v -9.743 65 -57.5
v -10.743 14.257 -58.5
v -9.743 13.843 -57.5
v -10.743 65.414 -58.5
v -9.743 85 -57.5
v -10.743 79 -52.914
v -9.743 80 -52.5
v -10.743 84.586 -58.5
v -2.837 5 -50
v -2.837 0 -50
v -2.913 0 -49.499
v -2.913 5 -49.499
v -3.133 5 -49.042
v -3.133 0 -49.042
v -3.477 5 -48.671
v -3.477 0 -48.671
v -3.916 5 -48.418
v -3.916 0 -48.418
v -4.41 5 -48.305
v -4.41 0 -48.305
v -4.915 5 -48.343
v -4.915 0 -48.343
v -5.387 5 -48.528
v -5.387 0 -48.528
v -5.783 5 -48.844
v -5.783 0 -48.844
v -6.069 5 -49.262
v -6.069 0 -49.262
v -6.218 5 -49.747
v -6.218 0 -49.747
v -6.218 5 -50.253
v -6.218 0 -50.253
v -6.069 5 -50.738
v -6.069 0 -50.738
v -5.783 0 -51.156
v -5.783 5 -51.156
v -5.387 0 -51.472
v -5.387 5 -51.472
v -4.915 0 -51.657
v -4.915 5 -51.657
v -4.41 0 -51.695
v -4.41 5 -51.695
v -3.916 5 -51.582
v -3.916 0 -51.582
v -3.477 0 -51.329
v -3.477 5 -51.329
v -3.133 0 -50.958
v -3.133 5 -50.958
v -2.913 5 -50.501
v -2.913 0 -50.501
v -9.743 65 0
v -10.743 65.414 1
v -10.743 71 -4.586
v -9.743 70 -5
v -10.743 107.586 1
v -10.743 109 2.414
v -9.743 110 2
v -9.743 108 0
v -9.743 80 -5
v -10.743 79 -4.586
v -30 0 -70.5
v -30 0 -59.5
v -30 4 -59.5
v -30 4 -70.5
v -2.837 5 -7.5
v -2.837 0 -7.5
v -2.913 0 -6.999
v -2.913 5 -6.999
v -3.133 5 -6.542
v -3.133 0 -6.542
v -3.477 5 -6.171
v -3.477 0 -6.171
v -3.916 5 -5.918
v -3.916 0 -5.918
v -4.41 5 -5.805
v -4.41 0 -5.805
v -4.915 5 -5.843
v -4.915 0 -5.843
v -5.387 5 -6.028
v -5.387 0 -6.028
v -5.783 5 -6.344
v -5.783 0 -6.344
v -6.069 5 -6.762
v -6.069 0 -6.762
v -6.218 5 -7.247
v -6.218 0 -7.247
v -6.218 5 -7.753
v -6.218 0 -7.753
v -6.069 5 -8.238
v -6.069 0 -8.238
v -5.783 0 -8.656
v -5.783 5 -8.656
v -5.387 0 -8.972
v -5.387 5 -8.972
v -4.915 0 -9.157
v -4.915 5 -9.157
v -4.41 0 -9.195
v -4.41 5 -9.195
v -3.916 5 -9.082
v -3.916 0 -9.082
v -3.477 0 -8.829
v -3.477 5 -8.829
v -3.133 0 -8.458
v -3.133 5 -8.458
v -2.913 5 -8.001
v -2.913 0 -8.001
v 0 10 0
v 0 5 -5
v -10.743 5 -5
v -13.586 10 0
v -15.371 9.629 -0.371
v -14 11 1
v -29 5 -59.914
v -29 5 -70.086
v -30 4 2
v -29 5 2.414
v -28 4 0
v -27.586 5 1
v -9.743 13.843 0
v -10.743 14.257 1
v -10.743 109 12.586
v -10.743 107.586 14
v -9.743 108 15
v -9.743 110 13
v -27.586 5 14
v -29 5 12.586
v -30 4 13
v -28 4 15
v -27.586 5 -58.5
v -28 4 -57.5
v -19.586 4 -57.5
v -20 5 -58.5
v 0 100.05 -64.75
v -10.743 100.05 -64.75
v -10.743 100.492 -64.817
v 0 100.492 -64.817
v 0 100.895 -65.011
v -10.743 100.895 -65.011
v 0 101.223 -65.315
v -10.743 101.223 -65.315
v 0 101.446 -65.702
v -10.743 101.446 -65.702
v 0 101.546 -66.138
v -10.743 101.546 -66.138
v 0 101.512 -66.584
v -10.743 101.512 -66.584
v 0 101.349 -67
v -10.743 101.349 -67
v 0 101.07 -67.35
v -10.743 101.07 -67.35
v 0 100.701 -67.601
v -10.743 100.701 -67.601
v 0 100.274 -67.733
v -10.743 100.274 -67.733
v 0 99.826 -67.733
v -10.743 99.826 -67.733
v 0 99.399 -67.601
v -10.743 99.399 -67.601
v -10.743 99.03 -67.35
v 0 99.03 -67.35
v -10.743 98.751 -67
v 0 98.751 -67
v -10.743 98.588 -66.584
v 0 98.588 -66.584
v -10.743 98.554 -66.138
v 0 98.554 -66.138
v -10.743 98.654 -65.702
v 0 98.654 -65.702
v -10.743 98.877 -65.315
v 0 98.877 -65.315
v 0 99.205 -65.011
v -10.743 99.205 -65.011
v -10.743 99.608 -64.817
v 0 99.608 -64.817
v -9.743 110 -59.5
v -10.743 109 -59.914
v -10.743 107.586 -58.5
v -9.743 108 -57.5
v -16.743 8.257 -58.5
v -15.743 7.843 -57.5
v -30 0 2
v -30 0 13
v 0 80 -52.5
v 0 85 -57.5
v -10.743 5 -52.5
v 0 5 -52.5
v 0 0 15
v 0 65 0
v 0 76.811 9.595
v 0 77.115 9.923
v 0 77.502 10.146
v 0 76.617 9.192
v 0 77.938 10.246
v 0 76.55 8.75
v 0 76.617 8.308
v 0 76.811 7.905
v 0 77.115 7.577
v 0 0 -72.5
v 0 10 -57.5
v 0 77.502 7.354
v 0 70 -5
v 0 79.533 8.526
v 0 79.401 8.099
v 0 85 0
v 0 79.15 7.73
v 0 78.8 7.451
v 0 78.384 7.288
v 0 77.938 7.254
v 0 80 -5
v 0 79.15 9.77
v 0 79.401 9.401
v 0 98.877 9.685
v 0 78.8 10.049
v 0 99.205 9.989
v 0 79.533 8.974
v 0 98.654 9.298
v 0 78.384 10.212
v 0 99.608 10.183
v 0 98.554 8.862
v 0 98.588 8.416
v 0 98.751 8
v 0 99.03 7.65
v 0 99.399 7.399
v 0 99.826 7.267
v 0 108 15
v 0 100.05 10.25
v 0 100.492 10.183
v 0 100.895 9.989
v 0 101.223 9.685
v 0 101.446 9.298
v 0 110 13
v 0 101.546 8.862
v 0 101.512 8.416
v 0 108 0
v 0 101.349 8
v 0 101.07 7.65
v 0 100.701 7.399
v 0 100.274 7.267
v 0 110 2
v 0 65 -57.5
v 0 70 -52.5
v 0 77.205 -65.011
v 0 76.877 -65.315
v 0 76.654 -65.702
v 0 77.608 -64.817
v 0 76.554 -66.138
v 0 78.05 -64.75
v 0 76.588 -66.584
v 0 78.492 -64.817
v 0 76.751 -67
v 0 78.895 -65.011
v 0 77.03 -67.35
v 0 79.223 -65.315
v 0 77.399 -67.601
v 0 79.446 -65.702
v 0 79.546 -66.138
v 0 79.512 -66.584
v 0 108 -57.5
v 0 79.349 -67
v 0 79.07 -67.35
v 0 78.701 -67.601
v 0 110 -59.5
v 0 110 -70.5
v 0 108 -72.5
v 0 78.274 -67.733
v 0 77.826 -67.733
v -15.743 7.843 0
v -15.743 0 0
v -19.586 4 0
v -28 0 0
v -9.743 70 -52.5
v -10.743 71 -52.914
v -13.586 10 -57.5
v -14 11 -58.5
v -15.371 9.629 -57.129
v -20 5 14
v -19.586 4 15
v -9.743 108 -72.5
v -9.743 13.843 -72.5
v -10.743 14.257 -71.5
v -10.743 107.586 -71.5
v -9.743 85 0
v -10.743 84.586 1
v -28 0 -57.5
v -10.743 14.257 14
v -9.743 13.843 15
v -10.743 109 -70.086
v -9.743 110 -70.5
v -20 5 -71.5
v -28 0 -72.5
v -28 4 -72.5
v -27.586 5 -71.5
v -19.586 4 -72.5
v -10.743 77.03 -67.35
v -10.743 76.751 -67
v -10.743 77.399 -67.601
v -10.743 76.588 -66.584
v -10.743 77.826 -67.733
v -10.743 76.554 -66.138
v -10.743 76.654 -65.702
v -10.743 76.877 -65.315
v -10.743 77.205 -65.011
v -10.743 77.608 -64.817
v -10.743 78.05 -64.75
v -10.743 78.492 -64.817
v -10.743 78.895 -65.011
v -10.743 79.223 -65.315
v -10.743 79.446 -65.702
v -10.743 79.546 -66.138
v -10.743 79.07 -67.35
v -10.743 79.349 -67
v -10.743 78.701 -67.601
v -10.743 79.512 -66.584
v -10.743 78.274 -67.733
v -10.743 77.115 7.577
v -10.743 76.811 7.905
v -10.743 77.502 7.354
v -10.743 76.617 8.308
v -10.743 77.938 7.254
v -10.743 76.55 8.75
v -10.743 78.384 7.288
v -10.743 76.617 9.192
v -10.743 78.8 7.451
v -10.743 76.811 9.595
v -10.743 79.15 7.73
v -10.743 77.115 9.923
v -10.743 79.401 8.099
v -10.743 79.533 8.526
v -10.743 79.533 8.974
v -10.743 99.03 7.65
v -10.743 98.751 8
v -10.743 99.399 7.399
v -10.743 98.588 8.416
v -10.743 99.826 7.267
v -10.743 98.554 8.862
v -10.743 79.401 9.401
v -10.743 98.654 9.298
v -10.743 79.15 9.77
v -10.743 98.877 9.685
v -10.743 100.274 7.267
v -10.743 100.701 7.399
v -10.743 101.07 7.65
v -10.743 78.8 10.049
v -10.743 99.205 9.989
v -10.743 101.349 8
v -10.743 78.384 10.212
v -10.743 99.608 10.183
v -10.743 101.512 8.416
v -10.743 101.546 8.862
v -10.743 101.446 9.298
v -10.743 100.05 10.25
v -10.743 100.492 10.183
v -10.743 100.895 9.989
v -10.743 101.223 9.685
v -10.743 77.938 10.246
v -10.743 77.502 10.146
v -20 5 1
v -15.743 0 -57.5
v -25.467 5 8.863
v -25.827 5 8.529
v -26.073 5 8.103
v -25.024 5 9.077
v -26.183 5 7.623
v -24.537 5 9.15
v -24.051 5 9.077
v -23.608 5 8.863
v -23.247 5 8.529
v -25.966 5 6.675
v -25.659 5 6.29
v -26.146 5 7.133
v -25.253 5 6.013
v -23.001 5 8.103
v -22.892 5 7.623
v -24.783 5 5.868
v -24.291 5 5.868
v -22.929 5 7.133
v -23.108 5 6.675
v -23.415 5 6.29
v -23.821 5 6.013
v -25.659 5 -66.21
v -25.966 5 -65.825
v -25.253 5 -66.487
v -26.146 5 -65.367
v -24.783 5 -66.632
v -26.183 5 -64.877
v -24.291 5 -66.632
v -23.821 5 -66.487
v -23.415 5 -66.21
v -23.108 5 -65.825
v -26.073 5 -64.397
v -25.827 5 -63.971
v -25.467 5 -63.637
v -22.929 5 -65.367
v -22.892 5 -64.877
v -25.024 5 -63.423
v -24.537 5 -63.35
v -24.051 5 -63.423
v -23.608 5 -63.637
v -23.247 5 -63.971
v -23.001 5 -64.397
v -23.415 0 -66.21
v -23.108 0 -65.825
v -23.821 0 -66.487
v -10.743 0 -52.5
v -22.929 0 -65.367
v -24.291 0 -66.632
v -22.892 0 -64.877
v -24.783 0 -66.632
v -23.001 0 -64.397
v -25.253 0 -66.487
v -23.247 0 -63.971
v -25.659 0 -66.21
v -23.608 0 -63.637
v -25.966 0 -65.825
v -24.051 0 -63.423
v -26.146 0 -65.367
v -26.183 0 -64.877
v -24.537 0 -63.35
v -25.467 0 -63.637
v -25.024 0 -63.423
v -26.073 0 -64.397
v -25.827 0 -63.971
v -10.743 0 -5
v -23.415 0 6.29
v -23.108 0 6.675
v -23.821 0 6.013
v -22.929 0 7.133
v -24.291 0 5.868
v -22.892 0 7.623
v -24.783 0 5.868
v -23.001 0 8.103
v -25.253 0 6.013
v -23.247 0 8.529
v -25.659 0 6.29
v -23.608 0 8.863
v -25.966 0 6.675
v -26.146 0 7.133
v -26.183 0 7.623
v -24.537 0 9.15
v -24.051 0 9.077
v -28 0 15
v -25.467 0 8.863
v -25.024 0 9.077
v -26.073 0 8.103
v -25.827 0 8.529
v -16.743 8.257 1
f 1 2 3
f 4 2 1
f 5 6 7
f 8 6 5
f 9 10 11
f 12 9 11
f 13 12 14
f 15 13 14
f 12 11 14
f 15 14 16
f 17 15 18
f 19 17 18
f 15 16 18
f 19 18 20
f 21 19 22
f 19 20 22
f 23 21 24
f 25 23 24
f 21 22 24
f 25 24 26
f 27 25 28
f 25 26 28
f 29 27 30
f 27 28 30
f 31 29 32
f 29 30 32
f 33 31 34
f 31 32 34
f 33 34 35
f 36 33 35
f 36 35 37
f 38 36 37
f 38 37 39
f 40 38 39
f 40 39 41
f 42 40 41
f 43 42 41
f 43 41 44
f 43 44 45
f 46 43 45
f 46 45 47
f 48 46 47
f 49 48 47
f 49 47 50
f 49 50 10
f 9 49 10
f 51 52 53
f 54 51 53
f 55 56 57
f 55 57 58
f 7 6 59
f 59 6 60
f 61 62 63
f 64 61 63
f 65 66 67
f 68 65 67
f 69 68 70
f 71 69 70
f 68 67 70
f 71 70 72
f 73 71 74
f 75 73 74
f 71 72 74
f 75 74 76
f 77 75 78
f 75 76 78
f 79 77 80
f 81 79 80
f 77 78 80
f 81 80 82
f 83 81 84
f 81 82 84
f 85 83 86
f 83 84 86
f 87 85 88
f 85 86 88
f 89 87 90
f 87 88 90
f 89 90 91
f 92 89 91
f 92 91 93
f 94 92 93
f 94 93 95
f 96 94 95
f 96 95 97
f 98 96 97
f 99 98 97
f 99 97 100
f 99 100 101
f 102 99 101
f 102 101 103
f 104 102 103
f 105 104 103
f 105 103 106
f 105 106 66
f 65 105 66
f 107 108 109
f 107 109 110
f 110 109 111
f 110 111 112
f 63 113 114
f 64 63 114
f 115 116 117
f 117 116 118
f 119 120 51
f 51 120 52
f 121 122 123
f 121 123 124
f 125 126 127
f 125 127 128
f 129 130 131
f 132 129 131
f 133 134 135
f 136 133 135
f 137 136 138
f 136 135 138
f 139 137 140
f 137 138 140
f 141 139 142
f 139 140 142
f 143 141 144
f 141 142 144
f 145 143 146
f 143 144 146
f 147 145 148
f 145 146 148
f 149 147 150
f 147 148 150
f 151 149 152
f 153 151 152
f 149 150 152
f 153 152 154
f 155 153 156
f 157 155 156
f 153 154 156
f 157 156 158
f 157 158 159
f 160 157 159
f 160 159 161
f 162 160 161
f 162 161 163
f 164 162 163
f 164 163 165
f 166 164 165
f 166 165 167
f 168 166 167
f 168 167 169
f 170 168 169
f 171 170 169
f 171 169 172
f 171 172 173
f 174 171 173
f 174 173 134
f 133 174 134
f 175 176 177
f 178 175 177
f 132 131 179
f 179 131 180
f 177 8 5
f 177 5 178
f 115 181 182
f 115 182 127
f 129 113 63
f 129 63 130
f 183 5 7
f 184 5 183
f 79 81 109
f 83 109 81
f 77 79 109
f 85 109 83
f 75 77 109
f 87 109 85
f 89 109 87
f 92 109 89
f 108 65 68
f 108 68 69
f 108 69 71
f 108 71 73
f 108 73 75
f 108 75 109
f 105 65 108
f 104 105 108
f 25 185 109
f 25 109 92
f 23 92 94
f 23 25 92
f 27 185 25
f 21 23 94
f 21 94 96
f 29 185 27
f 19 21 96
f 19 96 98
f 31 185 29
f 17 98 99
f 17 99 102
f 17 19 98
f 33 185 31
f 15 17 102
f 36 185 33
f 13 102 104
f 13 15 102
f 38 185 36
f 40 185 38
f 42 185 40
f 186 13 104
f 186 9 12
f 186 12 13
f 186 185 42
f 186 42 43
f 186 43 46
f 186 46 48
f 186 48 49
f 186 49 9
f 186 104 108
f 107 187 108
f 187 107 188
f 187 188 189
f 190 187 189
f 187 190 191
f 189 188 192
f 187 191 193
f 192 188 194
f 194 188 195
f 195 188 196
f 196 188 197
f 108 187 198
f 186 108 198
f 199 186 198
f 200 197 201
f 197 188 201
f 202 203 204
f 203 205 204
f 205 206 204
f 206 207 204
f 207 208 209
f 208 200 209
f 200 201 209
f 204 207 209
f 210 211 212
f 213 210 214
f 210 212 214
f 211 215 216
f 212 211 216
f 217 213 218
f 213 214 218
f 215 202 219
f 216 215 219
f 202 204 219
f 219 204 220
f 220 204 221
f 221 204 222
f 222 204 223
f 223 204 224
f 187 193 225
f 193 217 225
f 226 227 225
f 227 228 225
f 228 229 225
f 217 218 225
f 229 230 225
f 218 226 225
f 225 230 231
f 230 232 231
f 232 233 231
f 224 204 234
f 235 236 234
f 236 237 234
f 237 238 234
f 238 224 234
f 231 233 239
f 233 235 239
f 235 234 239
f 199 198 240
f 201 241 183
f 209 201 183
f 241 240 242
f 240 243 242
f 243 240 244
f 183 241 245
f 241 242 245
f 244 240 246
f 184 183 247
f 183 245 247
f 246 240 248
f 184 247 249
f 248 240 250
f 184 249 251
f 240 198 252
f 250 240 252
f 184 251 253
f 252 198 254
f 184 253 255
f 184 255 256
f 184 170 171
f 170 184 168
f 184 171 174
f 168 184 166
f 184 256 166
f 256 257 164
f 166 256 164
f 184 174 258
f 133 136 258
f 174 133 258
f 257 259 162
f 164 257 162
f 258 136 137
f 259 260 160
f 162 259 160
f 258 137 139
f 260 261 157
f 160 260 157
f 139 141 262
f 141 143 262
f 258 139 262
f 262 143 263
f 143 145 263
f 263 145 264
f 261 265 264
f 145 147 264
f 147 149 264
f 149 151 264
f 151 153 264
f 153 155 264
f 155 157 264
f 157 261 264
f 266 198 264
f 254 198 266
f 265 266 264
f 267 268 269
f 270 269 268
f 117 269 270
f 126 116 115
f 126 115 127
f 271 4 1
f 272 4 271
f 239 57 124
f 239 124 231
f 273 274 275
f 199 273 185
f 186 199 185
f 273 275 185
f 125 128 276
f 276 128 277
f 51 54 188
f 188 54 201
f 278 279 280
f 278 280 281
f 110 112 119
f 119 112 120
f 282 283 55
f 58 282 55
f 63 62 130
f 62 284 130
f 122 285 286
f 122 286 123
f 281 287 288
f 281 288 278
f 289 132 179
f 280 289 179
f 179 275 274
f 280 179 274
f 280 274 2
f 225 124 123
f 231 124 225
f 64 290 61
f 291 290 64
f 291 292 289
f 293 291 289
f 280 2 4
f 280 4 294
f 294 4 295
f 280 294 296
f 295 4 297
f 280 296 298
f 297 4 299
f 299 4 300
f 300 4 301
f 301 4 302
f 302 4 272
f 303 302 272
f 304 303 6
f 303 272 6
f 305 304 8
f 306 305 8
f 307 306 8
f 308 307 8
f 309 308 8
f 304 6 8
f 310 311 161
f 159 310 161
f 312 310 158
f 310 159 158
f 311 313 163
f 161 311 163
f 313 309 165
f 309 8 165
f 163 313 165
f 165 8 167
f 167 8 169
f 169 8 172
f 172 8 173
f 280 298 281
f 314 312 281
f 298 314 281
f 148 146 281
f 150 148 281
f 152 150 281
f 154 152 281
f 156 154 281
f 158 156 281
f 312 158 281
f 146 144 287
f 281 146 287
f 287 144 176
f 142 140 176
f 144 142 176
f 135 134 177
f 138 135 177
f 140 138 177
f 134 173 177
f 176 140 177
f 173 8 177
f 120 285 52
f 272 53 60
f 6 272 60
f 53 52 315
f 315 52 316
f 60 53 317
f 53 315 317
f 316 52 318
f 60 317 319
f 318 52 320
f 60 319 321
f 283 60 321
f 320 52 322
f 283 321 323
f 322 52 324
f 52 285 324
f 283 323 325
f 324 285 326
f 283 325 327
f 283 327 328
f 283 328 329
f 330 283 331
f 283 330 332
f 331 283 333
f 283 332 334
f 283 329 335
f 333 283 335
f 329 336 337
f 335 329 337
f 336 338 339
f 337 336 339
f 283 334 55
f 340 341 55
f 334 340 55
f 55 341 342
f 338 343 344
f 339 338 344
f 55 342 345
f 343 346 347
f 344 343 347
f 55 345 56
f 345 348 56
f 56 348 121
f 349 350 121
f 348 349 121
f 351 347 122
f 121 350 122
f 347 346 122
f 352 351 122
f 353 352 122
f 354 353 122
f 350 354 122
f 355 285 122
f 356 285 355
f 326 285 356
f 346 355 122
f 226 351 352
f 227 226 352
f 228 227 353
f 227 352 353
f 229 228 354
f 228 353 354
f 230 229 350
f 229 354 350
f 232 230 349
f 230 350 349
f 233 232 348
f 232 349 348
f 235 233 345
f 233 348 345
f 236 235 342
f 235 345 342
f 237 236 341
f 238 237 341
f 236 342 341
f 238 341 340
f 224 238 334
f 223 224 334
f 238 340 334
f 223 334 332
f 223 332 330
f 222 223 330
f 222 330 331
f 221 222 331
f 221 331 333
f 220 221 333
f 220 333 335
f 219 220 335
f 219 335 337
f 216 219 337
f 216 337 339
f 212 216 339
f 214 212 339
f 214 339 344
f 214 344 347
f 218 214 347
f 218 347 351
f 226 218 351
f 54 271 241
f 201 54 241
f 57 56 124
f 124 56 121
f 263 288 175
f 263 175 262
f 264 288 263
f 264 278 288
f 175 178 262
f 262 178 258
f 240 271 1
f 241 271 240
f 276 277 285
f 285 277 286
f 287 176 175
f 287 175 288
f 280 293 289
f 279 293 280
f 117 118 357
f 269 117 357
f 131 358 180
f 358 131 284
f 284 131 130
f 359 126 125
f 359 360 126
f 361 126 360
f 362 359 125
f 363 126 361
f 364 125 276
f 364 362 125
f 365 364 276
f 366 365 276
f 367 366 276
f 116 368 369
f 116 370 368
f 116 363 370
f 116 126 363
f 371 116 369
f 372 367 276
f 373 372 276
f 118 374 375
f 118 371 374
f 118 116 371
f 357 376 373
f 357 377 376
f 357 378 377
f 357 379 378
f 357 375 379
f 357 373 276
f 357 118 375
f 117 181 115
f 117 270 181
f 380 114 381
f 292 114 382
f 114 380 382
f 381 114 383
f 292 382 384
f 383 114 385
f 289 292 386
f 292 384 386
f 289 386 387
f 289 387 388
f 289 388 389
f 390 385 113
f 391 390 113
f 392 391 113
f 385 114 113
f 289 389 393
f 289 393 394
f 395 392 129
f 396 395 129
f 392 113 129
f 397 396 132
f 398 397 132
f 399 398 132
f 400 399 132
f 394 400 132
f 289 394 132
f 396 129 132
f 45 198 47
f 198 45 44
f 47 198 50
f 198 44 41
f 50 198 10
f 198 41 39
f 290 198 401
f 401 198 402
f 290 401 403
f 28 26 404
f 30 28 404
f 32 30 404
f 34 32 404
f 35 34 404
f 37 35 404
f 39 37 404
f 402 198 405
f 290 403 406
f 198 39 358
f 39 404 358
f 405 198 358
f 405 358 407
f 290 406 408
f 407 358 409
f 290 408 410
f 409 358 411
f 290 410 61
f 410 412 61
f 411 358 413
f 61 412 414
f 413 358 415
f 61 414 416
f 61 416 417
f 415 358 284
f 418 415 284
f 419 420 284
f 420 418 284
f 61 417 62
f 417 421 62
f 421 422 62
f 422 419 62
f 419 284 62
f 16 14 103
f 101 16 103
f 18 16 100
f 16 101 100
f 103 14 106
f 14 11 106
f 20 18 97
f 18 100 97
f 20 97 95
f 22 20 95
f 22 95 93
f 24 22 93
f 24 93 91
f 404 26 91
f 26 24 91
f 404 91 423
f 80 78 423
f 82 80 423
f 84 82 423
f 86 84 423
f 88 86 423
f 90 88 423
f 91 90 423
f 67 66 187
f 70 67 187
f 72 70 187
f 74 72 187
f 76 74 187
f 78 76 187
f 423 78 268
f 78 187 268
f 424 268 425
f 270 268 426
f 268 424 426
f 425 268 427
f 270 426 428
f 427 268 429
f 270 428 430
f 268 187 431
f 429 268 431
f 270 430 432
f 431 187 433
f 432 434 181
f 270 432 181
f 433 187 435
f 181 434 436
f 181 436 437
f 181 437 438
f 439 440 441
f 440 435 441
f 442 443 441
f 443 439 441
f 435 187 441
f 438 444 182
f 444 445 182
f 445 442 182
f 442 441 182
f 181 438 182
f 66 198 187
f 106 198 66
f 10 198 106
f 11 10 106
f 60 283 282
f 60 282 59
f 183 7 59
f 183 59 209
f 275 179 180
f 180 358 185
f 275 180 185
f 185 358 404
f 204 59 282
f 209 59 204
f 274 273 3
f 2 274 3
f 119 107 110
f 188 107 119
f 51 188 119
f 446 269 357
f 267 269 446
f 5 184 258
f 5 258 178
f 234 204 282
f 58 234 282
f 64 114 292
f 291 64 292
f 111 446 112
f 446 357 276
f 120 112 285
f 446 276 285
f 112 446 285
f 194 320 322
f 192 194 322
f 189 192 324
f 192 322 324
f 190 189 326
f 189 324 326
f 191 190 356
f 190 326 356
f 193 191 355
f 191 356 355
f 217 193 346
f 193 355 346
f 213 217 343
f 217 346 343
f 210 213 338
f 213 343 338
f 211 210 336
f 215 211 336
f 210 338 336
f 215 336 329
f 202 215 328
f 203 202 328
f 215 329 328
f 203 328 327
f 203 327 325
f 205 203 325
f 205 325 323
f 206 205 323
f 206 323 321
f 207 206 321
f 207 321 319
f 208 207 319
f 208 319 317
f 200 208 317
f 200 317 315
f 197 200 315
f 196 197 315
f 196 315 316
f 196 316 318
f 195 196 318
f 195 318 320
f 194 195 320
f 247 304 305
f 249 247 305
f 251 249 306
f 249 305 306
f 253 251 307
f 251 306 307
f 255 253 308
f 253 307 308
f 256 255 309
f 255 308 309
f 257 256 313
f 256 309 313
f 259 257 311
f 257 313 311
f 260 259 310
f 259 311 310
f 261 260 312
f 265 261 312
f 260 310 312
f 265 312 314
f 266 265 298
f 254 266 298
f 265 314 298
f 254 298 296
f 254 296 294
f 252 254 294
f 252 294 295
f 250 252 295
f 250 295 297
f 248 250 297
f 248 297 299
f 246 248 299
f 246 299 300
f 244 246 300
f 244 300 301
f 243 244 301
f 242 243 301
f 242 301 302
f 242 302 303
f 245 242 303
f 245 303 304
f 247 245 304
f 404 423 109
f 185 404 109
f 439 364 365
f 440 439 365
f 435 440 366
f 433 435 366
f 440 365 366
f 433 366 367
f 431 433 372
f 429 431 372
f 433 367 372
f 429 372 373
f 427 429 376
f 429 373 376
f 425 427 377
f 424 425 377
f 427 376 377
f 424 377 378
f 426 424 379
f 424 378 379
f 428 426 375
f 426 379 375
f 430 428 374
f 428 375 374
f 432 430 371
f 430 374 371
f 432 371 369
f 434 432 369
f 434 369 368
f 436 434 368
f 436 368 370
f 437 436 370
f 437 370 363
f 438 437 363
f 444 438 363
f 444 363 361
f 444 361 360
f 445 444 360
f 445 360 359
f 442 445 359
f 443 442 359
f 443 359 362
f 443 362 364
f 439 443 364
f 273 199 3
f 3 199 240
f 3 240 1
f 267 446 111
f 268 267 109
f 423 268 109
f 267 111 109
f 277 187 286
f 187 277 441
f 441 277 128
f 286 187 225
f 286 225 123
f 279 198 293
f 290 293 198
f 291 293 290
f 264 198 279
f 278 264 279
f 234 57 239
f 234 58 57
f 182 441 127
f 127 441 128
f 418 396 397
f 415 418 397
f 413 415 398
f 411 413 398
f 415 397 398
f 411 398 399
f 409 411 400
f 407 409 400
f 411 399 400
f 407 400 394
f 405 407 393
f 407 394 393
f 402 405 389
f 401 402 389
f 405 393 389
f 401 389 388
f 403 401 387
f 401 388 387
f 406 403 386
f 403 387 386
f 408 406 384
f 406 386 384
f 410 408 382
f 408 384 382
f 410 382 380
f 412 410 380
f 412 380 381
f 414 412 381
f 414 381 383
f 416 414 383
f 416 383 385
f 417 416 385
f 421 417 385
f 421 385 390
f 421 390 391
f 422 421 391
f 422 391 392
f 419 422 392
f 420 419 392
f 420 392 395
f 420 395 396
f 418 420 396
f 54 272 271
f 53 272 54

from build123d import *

# Parameters (mm, degrees)
EXTRUDE_1_DEPTH     = 15
SKETCH_3_W          = 10.742953118
SKETCH_3_H          = 10
EXTRUDE_2_DEPTH     = 57.5
SKETCH_4_W          = 10.742953118
SKETCH_4_H          = 5
EXTRUDE_3_DEPTH     = 57.5
CUT_EXTRUDE_1_REACH = 133.077
SKETCH_5_R          = 1.65
CUT_EXTRUDE_2_REACH = 137.116
SKETCH_6_R          = 1.7
CUT_EXTRUDE_3_REACH = 135.143
SKETCH_7_R          = 1.5
CHAMFER_1_SIZE      = 5
CHAMFER_2_SIZE      = 2
CHAMFER_3_SIZE      = 5
CHAMFER_4_SIZE      = 1


with BuildPart() as part:
    # 草图1 → 凸台-拉伸1 (new body)
    with BuildSketch(Plane.XY):
        Polygon((0, 110), (0, 0), (-30, 0), (-30, 5), (-20, 5), (-10.742953118, 14.257046882), (-10.742953118, 110), align=None)
    extrude(amount=EXTRUDE_1_DEPTH)


with BuildPart() as body_2:
    # 镜向9: mirrored copy
    add(part.part.mirror(Plane.XY.offset(-28.75)))


with BuildPart() as part_1:
    add(part.part)

    add(body_2.part)  # 凸台-拉伸2 merges body 2
    # 草图3 → 凸台-拉伸2 (add)
    with BuildSketch(Plane.XY.offset(-57.5)):
        with Locations((-5.371476559, 75)):
            Rectangle(SKETCH_3_W, SKETCH_3_H)
    extrude(amount=EXTRUDE_2_DEPTH)

    # 草图4 → 凸台-拉伸3 (add)
    with BuildSketch(Plane.XY.offset(-57.5)):
        with Locations((-5.371476559, 2.5)):
            Rectangle(SKETCH_4_W, SKETCH_4_H)
    extrude(amount=EXTRUDE_3_DEPTH)

    # 草图5 → 切除-拉伸1 (cut, up to next)
    with BuildSketch(Plane(origin=(0, 5, 0), x_dir=(1, 0, 0), z_dir=(0, 1, 0)), mode=Mode.PRIVATE) as cut_extrude_1_sk1:
        with Locations(Location((-24.537178605, 65, 0), (0, 0, 270))):
            Circle(SKETCH_5_R)
    cut_extrude_1_tool1 = extrude(cut_extrude_1_sk1.sketch, amount=-CUT_EXTRUDE_1_REACH, mode=Mode.PRIVATE) & part_1.part
    # 草图5 → 切除-拉伸1 (cut, up to next)
    with BuildSketch(Plane(origin=(0, 5, 0), x_dir=(1, 0, 0), z_dir=(0, 1, 0)), mode=Mode.PRIVATE) as cut_extrude_1_sk2:
        with Locations(Location((-24.537178605, -7.5, 0), (0, 0, 270))):
            Circle(SKETCH_5_R)
    cut_extrude_1_tool2 = extrude(cut_extrude_1_sk2.sketch, amount=-CUT_EXTRUDE_1_REACH, mode=Mode.PRIVATE) & part_1.part
    add(cut_extrude_1_tool1.solids().sort_by_distance((-24.537179, 5, -65))[0], mode=Mode.SUBTRACT)
    add(cut_extrude_1_tool2.solids().sort_by_distance((-24.537179, 5, 7.5))[0], mode=Mode.SUBTRACT)

    # 草图6 → 切除-拉伸2 (cut, up to next)
    with BuildSketch(Plane.XZ, mode=Mode.PRIVATE) as cut_extrude_2_sk1:
        with Locations((-4.537178605, -7.5)):
            Circle(SKETCH_6_R)
    cut_extrude_2_tool1 = extrude(cut_extrude_2_sk1.sketch, amount=-CUT_EXTRUDE_2_REACH, mode=Mode.PRIVATE) & part_1.part
    # 草图6 → 切除-拉伸2 (cut, up to next)
    with BuildSketch(Plane.XZ, mode=Mode.PRIVATE) as cut_extrude_2_sk2:
        with Locations((-4.537178605, -50)):
            Circle(SKETCH_6_R)
    cut_extrude_2_tool2 = extrude(cut_extrude_2_sk2.sketch, amount=-CUT_EXTRUDE_2_REACH, mode=Mode.PRIVATE) & part_1.part
    add(cut_extrude_2_tool1.solids().sort_by_distance((-4.537179, 0, -7.5))[0], mode=Mode.SUBTRACT)
    add(cut_extrude_2_tool2.solids().sort_by_distance((-4.537179, 0, -50))[0], mode=Mode.SUBTRACT)

    # 草图7 → 切除-拉伸3 (cut, up to next)
    with BuildSketch(Plane.ZY.offset(10.742953118), mode=Mode.PRIVATE) as cut_extrude_3_sk1:
        with Locations((-66.25, 100.05)):
            Circle(SKETCH_7_R)
    cut_extrude_3_tool1 = extrude(cut_extrude_3_sk1.sketch, amount=-CUT_EXTRUDE_3_REACH, mode=Mode.PRIVATE) & part_1.part
    # 草图7 → 切除-拉伸3 (cut, up to next)
    with BuildSketch(Plane.ZY.offset(10.742953118), mode=Mode.PRIVATE) as cut_extrude_3_sk2:
        with Locations((8.75, 100.05)):
            Circle(SKETCH_7_R)
    cut_extrude_3_tool2 = extrude(cut_extrude_3_sk2.sketch, amount=-CUT_EXTRUDE_3_REACH, mode=Mode.PRIVATE) & part_1.part
    # 草图7 → 切除-拉伸3 (cut, up to next)
    with BuildSketch(Plane.ZY.offset(10.742953118), mode=Mode.PRIVATE) as cut_extrude_3_sk3:
        with Locations((-66.25, 78.05)):
            Circle(SKETCH_7_R)
    cut_extrude_3_tool3 = extrude(cut_extrude_3_sk3.sketch, amount=-CUT_EXTRUDE_3_REACH, mode=Mode.PRIVATE) & part_1.part
    # 草图7 → 切除-拉伸3 (cut, up to next)
    with BuildSketch(Plane.ZY.offset(10.742953118), mode=Mode.PRIVATE) as cut_extrude_3_sk4:
        with Locations(Location((8.75, 78.05, 0), (0, 0, 270))):
            Circle(SKETCH_7_R)
    cut_extrude_3_tool4 = extrude(cut_extrude_3_sk4.sketch, amount=-CUT_EXTRUDE_3_REACH, mode=Mode.PRIVATE) & part_1.part
    add(cut_extrude_3_tool1.solids().sort_by_distance((-10.742953, 100.05, -66.25))[0], mode=Mode.SUBTRACT)
    add(cut_extrude_3_tool2.solids().sort_by_distance((-10.742953, 100.05, 8.75))[0], mode=Mode.SUBTRACT)
    add(cut_extrude_3_tool3.solids().sort_by_distance((-10.742953, 78.05, -66.25))[0], mode=Mode.SUBTRACT)
    add(cut_extrude_3_tool4.solids().sort_by_distance((-10.742953, 78.05, 8.75))[0], mode=Mode.SUBTRACT)

    # 倒角1
    chamfer_1_edges = [part_1.edges().sort_by_distance(p)[0] for p in [
        (-5.371476559, 80, 0),
        (-5.371476559, 80, -57.5),
        (-5.371476559, 70, 0),
        (-5.371476559, 70, -57.5),
        (-5.371476559, 5, 0),
        (-5.371476559, 5, -57.5),
    ]]
    chamfer(chamfer_1_edges, length=CHAMFER_1_SIZE)

    # 倒角2
    chamfer_2_edges = [part_1.edges().sort_by_distance(p)[0] for p in [
        (-5.371476559, 110, 0),
        (-30, 2.5, 15),
        (-5.371476559, 110, -57.5),
        (-30, 2.5, -57.5),
        (-5.371476559, 110, -72.5),
        (-30, 2.5, -72.5),
        (-5.371476559, 110, 15),
        (-30, 2.5, 0),
    ]]
    chamfer(chamfer_2_edges, length=CHAMFER_2_SIZE)

    # 倒角3
    # the kernel refuses this chamfer: 5 mm, written as the material it adds along each edge
    with BuildSketch(Plane(origin=(-10.742953118, 22.85841494, 0), x_dir=(-0.9996219169112968, 0, 0.027495876610586372), z_dir=(0, -1, 0))) as chamfer_3_piece_1_section:
        Polygon((CHAMFER_3_SIZE * 0.999621916911, CHAMFER_3_SIZE * 0.0274958766106), (-CHAMFER_3_SIZE * 0.0274958766106, CHAMFER_3_SIZE * 0.999621916911), (0, 0), align=None)
    chamfer_3_piece_1 = extrude(amount=22.85841494, mode=Mode.PRIVATE)
    chamfer_3_piece_1 = split(chamfer_3_piece_1, bisect_by=Plane(origin=(-12.636913345, 5, -1.178868923), z_dir=(0, 1, 0)), keep=Keep.TOP, mode=Mode.PRIVATE)
    chamfer_3_piece_1 = split(chamfer_3_piece_1, bisect_by=Plane(origin=(-12.636913345, 7.862667434, -2.137332566), z_dir=(0, -0.7071067811865476, 0.7071067811865476)), keep=Keep.TOP, mode=Mode.PRIVATE)
    chamfer_3_piece_1 = split(chamfer_3_piece_1, bisect_by=Plane(origin=(-15.366354777, 9.633645223, -1.178868923), z_dir=(0.7071067811865488, -0.7071067811865464, 0)), keep=Keep.TOP, mode=Mode.PRIVATE)
    add(chamfer_3_piece_1)
    with BuildSketch(Plane(origin=(-10.742953118, 22.85841494, 0), x_dir=(-0.9996219169112968, 0, 0.027495876610586372), z_dir=(0, -1, 0))) as chamfer_3_piece_2_section:
        Polygon((CHAMFER_3_SIZE * 0.999621916911, CHAMFER_3_SIZE * 0.0274958766106), (-CHAMFER_3_SIZE * 0.0274958766106, CHAMFER_3_SIZE * 0.999621916911), (0, 0), align=None)
    chamfer_3_piece_2 = extrude(amount=22.85841494, mode=Mode.PRIVATE)
    chamfer_3_piece_2 = split(chamfer_3_piece_2, bisect_by=Plane(origin=(-12.391958981, 5, -1.648896507), z_dir=(0, -1, 0)), keep=Keep.TOP, mode=Mode.PRIVATE)
    chamfer_3_piece_2 = split(chamfer_3_piece_2, bisect_by=Plane(origin=(-12.391958981, 5.425526159, -4.574473841), z_dir=(0, -0.7071067811865476, 0.7071067811865476)), keep=Keep.TOP, mode=Mode.PRIVATE)
    add(chamfer_3_piece_2)
    with BuildSketch(Plane(origin=(-10.742953118, 0, -57.5), x_dir=(-0.9996219169112968, 0, -0.027495876610586317), z_dir=(0, 1, 0))) as chamfer_3_piece_3_section:
        Polygon((CHAMFER_3_SIZE * 0.999621916911, CHAMFER_3_SIZE * 0.0274958766106), (-CHAMFER_3_SIZE * 0.0274958766106, CHAMFER_3_SIZE * 0.999621916911), (0, 0), align=None)
    chamfer_3_piece_3 = extrude(amount=22.85841494, mode=Mode.PRIVATE)
    chamfer_3_piece_3 = split(chamfer_3_piece_3, bisect_by=Plane(origin=(-12.391958981, 5.425526159, -52.925526159), z_dir=(0, -0.7071067811865476, -0.7071067811865476)), keep=Keep.TOP, mode=Mode.PRIVATE)
    chamfer_3_piece_3 = split(chamfer_3_piece_3, bisect_by=Plane(origin=(-12.391958981, 5, -55.851103493), z_dir=(0, -1, 0)), keep=Keep.TOP, mode=Mode.PRIVATE)
    add(chamfer_3_piece_3)
    with BuildSketch(Plane(origin=(-10.742953118, 0, -57.5), x_dir=(-0.9996219169112968, 0, -0.027495876610586317), z_dir=(0, 1, 0))) as chamfer_3_piece_4_section:
        Polygon((CHAMFER_3_SIZE * 0.999621916911, CHAMFER_3_SIZE * 0.0274958766106), (-CHAMFER_3_SIZE * 0.0274958766106, CHAMFER_3_SIZE * 0.999621916911), (0, 0), align=None)
    chamfer_3_piece_4 = extrude(amount=22.85841494, mode=Mode.PRIVATE)
    chamfer_3_piece_4 = split(chamfer_3_piece_4, bisect_by=Plane(origin=(-12.636913345, 7.862667434, -55.362667434), z_dir=(0, -0.7071067811865476, -0.7071067811865476)), keep=Keep.TOP, mode=Mode.PRIVATE)
    chamfer_3_piece_4 = split(chamfer_3_piece_4, bisect_by=Plane(origin=(-15.366354777, 9.633645223, -56.321131077), z_dir=(0.7071067811865488, -0.7071067811865464, 0)), keep=Keep.TOP, mode=Mode.PRIVATE)
    chamfer_3_piece_4 = split(chamfer_3_piece_4, bisect_by=Plane(origin=(-12.636913345, 5, -56.321131077), z_dir=(0, 1, 0)), keep=Keep.TOP, mode=Mode.PRIVATE)
    add(chamfer_3_piece_4)

    # 倒角4
    chamfer_4_edges = [part_1.edges().sort_by_distance(p)[0] for p in [
        (-10.742953118, 39.628523441, 0),
        (-10.742953118, 39.628523441, -57.5),
        (-10.742953118, 70, -28.75),
        (-10.742953118, 80, -28.75),
        (-10.742953118, 67.5, -55),
        (-10.742953118, 67.5, -2.5),
        (-10.742953118, 82.5, -2.5),
        (-10.742953118, 82.5, -55),
        (-15.371476559, 9.628523441, 15),
        (-10.742953118, 61.128523441, 15),
        (-24, 5, 15),
        (-30, 5, 7.5),
        (-29, 5, 1),
        (-29, 5, 14),
        (-30, 5, -65),
        (-29, 5, -71.5),
        (-29, 5, -58.5),
        (-10.742953118, 61.128523441, -72.5),
        (-10.742953118, 96.5, 0),
        (-10.742953118, 96.5, -57.5),
        (-10.742953118, 110, -65),
        (-10.742953118, 110, 7.5),
        (-10.742953118, 109, -71.5),
        (-10.742953118, 109, -58.5),
        (-10.742953118, 109, 1),
        (-10.742953118, 109, 14),
        (-17.871476559, 7.128523441, 0),
        (-17.871476559, 7.128523441, -57.5),
        (-12.871476559, 12.128523441, -57.5),
        (-24, 5, -57.5),
        (-15.371476559, 9.628523441, -72.5),
        (-24, 5, -72.5),
        (-24, 5, 0),
        (-12.871476559, 12.128523441, 0),
    ]]
    chamfer(chamfer_4_edges, length=CHAMFER_4_SIZE)


solid = part_1.part
